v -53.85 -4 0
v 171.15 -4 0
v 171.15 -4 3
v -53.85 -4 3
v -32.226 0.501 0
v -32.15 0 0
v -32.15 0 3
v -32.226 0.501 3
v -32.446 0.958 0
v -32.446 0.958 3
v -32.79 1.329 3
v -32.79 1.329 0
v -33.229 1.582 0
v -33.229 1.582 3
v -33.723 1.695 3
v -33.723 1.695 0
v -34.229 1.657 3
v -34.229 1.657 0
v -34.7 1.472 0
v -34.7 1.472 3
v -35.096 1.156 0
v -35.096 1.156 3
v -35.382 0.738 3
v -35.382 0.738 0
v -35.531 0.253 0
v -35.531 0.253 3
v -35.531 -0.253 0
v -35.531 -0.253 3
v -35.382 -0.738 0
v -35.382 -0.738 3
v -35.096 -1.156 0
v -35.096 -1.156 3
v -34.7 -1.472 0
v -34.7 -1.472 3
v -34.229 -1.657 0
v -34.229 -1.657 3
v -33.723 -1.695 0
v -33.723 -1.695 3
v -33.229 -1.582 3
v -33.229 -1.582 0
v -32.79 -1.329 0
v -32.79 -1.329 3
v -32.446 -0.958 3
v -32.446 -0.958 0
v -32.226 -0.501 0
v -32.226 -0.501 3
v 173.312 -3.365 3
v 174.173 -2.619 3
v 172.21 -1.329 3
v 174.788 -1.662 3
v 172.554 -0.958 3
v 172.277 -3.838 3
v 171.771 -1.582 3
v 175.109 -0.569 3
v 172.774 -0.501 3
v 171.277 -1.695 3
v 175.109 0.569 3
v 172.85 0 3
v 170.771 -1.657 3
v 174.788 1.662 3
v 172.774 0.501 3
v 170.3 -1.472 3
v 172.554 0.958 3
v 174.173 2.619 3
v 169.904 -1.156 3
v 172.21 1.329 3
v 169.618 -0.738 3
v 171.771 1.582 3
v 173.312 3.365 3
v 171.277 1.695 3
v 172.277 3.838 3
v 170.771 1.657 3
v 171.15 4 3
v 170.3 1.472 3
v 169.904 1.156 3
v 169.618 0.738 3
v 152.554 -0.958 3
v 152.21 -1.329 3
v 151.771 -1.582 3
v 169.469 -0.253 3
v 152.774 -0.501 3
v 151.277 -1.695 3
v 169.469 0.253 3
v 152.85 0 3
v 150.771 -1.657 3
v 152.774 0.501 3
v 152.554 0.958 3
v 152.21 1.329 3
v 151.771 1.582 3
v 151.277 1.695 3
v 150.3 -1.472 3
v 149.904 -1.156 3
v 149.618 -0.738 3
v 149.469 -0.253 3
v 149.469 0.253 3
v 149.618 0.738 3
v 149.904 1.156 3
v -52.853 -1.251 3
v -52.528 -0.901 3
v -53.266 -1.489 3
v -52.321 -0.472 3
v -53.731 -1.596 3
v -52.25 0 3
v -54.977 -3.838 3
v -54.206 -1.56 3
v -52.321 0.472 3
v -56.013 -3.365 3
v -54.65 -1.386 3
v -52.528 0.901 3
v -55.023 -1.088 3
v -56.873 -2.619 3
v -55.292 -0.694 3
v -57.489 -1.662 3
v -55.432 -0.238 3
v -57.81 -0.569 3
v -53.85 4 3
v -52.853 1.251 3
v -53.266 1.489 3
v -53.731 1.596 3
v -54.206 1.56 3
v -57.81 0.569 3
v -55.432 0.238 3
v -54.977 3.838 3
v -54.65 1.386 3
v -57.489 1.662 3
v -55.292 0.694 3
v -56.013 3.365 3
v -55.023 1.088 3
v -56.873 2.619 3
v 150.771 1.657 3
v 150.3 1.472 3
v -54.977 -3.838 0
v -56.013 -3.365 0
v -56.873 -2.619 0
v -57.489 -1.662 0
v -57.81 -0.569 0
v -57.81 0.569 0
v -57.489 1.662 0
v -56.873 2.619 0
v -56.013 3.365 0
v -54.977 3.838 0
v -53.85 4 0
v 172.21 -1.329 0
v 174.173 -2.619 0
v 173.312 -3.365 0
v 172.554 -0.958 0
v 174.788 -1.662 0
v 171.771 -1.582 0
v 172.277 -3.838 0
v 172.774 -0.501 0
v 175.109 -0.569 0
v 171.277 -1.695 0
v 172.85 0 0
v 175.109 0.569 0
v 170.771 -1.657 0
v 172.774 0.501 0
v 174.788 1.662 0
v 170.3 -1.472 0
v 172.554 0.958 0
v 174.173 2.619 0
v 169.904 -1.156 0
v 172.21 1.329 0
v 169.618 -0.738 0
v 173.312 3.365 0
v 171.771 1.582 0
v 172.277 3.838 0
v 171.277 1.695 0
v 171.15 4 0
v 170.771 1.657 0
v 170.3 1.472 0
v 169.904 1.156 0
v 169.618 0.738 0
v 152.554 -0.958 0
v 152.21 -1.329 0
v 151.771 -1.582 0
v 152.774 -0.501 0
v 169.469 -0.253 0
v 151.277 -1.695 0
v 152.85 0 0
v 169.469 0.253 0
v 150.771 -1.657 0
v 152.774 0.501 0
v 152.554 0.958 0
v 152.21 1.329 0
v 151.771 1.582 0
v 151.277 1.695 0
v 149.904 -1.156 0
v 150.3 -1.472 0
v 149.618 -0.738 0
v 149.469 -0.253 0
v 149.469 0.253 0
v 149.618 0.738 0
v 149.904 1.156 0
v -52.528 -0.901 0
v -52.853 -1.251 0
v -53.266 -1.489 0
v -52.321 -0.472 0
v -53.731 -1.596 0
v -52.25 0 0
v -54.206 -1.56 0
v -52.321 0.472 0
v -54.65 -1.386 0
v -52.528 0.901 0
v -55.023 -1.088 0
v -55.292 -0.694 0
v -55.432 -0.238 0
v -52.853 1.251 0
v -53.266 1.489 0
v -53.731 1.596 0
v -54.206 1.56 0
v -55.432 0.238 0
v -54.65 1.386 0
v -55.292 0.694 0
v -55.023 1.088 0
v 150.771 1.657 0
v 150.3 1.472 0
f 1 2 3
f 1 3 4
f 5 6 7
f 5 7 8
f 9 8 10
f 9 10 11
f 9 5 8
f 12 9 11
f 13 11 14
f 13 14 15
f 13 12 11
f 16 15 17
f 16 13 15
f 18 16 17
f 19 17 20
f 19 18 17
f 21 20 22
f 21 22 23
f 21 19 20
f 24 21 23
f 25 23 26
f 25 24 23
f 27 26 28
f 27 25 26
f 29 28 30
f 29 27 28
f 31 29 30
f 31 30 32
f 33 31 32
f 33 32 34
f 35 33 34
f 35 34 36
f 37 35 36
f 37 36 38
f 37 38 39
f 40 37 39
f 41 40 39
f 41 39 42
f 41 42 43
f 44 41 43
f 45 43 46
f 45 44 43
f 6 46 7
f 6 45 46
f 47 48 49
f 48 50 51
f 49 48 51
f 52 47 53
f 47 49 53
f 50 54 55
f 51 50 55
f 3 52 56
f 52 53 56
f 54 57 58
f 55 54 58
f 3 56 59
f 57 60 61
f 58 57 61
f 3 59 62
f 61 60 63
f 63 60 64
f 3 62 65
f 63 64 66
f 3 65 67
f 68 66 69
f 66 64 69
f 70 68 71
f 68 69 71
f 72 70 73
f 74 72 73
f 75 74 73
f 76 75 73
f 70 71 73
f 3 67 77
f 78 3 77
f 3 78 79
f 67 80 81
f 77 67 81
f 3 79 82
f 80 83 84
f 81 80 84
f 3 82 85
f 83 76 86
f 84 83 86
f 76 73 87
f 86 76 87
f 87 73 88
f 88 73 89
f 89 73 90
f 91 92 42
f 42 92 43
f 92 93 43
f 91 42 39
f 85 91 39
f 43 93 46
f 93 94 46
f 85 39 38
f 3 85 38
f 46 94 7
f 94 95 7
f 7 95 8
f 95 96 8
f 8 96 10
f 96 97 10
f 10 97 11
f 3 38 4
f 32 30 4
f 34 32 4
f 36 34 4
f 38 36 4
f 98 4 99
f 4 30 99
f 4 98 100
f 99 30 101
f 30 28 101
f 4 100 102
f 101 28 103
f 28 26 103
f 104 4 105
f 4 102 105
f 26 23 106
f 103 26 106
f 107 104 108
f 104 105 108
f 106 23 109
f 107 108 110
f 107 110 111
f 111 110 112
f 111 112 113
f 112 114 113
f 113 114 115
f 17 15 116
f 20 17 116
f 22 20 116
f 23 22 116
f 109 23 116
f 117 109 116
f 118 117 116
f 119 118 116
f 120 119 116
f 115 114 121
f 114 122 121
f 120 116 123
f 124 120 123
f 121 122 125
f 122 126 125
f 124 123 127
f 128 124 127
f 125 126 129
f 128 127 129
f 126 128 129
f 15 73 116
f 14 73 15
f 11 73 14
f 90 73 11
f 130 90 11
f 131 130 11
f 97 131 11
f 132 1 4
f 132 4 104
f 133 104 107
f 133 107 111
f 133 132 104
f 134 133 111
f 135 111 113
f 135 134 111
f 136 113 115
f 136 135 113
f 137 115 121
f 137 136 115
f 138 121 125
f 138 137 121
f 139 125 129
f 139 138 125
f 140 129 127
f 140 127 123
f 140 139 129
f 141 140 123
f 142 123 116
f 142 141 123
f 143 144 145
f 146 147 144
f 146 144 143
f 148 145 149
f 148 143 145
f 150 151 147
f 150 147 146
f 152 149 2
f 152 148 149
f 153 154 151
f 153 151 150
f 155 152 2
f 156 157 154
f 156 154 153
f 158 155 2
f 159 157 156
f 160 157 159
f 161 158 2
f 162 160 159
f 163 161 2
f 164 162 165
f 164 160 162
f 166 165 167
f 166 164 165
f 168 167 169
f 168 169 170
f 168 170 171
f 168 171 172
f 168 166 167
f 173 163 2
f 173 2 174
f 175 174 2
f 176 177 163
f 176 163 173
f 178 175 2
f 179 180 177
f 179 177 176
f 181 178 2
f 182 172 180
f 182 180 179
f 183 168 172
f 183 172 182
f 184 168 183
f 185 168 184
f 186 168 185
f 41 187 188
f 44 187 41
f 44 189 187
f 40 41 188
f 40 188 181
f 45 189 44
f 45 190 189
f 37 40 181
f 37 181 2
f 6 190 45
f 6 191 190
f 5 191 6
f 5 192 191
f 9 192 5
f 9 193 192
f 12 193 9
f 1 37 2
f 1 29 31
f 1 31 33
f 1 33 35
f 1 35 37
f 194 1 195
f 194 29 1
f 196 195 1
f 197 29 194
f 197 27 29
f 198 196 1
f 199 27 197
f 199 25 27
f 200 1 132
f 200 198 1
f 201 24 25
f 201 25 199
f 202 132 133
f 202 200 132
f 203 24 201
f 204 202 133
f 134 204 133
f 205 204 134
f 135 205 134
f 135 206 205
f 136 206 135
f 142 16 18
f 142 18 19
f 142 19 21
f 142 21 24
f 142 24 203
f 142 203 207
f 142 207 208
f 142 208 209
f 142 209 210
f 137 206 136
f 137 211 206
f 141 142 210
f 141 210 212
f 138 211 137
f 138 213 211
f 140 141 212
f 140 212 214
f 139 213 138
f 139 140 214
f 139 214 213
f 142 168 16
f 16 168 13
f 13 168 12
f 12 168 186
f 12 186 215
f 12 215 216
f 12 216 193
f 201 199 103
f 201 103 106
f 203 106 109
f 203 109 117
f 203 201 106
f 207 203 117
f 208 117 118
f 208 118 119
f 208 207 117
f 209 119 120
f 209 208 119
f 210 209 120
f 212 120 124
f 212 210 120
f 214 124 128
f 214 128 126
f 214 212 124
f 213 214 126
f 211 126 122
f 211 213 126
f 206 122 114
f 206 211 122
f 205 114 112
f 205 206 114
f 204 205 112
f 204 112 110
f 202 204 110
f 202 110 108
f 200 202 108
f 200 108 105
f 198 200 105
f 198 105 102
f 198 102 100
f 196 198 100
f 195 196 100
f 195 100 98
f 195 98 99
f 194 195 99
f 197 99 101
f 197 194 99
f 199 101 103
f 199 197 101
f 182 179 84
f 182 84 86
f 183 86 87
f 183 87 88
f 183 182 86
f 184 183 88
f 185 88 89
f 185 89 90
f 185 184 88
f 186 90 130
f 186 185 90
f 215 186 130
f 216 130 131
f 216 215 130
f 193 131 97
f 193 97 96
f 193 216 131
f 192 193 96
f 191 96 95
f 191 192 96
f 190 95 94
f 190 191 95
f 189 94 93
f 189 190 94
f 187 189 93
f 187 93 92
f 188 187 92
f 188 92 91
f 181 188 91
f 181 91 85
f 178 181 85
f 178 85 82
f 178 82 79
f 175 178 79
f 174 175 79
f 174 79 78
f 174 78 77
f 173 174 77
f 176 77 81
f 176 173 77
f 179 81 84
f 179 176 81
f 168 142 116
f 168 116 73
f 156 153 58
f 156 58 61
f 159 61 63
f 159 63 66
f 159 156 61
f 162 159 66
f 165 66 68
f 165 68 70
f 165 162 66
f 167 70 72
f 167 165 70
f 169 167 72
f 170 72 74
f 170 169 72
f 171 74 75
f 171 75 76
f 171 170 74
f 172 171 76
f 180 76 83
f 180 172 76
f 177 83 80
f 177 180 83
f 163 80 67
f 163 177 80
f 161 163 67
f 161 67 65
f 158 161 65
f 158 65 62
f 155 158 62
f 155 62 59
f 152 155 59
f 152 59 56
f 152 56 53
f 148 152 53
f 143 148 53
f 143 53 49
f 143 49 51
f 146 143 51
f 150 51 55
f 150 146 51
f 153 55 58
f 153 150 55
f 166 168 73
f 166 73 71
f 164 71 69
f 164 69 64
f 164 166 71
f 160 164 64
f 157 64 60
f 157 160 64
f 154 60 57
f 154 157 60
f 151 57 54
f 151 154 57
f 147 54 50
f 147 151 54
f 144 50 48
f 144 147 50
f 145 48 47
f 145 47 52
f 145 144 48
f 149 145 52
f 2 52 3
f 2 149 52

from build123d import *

# Parameters (mm, degrees)
SKETCH_1_R      = 1.6
SKETCH_1_R_2    = 1.7
EXTRUDE_1_DEPTH = 3


with BuildPart() as part:
    # 草图1 → 凸台-拉伸1 (new body)
    with BuildSketch(Plane.XY):
        with BuildLine():
            Line((-53.850242828, 4), (171.149757172, 4))
            ThreePointArc((171.149757172, 4), (175.149757172, 0), (171.149757172, -4))
            Line((171.149757172, -4), (-53.850242828, -4))
            ThreePointArc((-53.850242828, -4), (-57.850242828, 0), (-53.850242828, 4))
        make_face()
        with Locations((-53.850242828, 0)):
            Circle(SKETCH_1_R, mode=Mode.SUBTRACT)
        with Locations((171.149757172, 0)):
            Circle(SKETCH_1_R_2, mode=Mode.SUBTRACT)
        with Locations((151.149757172, 0)):
            Circle(SKETCH_1_R_2, mode=Mode.SUBTRACT)
        with Locations((-33.850242828, 0)):
            Circle(SKETCH_1_R_2, mode=Mode.SUBTRACT)
    extrude(amount=EXTRUDE_1_DEPTH)


solid = part.part
